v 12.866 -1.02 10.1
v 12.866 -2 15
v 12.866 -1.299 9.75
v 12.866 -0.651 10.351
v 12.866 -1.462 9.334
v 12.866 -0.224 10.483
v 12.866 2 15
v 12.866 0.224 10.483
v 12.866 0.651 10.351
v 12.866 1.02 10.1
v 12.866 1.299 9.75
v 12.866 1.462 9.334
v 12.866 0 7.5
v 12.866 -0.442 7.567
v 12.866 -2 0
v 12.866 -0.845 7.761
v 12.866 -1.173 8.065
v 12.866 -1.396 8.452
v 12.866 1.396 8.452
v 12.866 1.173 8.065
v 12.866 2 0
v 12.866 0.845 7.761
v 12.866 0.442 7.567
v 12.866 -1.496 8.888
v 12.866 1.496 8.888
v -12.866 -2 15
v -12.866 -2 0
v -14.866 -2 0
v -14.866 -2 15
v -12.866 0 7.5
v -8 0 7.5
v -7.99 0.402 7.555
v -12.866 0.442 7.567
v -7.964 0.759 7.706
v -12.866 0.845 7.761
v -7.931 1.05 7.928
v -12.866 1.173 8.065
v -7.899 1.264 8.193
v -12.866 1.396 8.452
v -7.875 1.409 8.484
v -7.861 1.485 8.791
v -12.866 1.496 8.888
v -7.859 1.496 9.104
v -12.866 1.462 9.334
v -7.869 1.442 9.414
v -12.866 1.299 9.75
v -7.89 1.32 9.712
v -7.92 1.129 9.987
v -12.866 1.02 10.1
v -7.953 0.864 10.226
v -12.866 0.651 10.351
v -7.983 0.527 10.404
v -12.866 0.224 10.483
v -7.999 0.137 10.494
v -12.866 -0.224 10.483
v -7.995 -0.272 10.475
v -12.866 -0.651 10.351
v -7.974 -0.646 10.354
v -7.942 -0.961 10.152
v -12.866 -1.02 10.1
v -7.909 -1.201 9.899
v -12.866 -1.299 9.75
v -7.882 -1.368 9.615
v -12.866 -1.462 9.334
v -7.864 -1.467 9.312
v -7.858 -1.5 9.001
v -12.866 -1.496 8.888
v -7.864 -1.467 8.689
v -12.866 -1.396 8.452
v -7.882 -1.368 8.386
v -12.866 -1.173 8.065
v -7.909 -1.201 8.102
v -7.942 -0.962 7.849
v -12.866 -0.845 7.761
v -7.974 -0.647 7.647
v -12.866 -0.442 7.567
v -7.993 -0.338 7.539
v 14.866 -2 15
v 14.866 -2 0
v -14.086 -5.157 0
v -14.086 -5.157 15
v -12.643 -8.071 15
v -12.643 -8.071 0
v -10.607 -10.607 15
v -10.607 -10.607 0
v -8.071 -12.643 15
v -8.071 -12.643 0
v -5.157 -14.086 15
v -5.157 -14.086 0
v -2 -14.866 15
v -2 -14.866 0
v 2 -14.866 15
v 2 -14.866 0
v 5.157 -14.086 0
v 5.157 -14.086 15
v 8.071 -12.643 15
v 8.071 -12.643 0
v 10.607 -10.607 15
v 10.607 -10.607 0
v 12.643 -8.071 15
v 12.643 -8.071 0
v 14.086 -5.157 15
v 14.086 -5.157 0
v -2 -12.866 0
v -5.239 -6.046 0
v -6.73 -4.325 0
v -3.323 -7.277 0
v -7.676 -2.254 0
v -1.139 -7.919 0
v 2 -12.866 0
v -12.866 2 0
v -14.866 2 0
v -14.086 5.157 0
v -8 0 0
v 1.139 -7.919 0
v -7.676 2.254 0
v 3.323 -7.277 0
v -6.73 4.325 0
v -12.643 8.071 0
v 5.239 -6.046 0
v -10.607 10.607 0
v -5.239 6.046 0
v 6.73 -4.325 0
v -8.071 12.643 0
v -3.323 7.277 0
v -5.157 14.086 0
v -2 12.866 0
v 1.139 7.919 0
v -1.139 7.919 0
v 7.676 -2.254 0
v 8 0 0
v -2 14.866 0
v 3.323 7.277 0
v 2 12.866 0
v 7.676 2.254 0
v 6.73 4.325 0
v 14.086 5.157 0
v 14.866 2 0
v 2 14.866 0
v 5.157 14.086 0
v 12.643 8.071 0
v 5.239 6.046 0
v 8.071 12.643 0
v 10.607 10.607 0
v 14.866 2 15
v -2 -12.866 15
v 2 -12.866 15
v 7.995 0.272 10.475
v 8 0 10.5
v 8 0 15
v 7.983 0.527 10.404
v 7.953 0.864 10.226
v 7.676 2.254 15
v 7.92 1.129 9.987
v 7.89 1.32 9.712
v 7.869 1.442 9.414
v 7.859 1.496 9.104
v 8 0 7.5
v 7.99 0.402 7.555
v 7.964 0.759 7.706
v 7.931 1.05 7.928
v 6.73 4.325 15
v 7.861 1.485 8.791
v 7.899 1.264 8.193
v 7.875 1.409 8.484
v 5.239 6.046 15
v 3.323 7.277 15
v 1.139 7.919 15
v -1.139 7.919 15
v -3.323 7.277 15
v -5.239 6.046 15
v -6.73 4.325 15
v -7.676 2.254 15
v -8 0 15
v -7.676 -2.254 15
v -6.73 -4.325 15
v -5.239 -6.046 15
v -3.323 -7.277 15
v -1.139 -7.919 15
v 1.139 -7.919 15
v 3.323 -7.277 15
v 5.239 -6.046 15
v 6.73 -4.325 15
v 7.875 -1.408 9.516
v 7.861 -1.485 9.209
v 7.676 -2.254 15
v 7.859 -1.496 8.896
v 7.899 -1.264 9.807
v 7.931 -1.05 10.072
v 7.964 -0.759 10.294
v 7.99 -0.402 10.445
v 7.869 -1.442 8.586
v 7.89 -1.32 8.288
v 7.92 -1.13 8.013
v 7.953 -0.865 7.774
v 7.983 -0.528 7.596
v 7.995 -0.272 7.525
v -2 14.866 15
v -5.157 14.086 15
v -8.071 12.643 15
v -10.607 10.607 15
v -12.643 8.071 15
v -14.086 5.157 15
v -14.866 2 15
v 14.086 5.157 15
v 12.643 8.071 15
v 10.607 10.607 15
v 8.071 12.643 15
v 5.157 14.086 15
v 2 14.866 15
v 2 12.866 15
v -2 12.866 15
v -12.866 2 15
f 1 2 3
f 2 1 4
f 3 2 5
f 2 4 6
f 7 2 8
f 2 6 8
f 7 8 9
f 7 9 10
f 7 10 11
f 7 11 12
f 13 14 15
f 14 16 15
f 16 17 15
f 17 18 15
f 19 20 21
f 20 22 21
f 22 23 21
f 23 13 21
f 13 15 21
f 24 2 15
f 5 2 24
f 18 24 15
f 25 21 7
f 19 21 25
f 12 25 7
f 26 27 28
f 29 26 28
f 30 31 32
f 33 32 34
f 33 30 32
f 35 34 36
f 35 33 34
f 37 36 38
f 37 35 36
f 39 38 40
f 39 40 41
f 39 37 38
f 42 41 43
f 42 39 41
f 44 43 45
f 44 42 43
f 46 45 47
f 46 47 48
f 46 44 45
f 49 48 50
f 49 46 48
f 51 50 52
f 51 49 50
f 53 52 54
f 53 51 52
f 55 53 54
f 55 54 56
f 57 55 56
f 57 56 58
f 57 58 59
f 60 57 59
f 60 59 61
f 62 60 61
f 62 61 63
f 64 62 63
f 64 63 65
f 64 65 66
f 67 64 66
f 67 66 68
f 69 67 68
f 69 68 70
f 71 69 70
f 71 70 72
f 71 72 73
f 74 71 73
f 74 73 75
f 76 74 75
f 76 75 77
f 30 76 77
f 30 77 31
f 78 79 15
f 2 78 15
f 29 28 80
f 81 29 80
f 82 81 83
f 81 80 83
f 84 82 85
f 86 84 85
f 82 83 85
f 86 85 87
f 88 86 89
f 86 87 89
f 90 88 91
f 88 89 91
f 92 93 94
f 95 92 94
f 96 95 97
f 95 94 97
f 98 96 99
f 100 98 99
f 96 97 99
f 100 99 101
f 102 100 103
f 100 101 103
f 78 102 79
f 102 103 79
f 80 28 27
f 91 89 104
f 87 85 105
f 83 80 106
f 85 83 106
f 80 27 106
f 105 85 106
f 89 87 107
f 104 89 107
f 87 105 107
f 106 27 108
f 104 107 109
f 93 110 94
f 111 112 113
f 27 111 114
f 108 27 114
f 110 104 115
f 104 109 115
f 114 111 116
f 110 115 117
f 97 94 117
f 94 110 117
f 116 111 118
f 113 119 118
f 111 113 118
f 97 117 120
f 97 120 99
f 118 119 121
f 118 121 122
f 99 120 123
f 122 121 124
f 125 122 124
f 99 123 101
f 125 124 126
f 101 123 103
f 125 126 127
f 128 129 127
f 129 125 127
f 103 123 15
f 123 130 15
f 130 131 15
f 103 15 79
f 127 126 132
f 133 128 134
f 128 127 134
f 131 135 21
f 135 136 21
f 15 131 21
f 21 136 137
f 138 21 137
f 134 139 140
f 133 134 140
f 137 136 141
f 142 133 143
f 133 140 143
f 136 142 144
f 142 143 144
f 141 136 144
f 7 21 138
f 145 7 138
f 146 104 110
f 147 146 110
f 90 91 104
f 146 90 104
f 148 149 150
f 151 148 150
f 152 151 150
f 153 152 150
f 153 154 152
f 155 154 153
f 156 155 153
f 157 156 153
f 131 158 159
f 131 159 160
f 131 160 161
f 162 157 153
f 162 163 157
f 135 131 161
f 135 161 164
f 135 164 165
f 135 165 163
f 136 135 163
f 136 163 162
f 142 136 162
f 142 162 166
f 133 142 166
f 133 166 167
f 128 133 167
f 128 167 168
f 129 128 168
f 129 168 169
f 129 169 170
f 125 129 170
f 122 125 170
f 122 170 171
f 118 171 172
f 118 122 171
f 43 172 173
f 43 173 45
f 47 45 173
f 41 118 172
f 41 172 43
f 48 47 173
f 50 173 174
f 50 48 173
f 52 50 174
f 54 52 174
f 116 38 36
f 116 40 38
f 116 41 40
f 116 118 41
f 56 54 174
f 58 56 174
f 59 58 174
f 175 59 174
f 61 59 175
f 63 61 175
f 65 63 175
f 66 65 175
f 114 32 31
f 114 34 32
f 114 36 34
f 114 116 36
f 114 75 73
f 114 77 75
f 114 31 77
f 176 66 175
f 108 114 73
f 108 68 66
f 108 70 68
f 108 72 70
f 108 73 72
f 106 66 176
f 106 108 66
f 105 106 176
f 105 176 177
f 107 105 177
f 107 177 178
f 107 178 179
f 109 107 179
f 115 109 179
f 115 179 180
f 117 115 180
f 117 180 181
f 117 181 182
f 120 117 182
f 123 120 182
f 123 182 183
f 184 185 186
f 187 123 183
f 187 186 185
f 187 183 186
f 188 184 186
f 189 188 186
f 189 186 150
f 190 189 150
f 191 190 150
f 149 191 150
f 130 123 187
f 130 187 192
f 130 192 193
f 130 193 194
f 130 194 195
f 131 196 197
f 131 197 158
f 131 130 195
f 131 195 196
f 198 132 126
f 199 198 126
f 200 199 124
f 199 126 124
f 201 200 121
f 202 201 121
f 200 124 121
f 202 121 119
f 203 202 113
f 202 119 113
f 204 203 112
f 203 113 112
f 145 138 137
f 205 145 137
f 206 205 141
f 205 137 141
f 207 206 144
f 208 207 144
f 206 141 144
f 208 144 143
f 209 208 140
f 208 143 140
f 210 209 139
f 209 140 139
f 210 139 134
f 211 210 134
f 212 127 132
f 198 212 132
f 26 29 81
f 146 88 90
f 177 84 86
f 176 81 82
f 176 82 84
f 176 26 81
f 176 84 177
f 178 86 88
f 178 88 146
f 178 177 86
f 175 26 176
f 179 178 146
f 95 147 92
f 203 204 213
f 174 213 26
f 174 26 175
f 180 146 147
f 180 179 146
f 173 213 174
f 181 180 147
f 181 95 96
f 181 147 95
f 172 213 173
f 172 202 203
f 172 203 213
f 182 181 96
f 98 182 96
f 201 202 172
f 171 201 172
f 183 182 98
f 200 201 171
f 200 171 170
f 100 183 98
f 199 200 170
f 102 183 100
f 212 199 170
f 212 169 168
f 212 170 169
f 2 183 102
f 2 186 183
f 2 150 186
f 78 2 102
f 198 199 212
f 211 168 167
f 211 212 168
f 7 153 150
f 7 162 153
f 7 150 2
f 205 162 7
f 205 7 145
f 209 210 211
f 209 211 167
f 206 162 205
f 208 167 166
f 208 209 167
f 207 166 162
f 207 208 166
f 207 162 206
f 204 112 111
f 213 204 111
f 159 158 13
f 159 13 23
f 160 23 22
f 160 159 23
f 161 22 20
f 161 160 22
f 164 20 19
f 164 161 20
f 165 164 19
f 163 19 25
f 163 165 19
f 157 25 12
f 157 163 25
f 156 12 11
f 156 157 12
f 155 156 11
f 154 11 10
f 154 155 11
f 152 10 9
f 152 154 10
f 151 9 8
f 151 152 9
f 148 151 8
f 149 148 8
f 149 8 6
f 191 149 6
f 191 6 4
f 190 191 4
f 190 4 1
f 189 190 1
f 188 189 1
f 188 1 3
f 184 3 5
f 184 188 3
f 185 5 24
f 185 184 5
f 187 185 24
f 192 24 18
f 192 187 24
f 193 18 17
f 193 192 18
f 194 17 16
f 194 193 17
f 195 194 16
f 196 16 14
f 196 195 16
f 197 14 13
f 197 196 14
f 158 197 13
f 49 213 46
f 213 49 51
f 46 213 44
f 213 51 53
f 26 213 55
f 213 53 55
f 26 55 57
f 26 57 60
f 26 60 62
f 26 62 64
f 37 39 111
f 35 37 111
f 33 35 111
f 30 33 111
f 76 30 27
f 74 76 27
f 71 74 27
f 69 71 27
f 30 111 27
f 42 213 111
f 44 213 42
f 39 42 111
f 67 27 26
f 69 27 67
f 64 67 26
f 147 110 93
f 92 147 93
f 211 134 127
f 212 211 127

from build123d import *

# Parameters (mm, degrees)
ESBO_O1_R                  = 8
RESSALTO_EXTRUS_O1_DEPTH   = 15
CORTE_EXTRUS_O1_DEPTH      = 26.82634314
CORTE_EXTRUS_O1_DEPTH_BACK = 26.82634314
ESBO_O2_R                  = 1.5


with BuildPart() as part:
    # Esboço1 → Ressalto-extrusão1 (new body)
    with BuildSketch(Plane.XY):
        with BuildLine():
            Line((2, 12.866068747), (-2, 12.866068747))
            Line((-2, 12.866068747), (-2, 14.866068747))
            ThreePointArc((-2, 14.866068747), (-10.606601718, 10.606601718), (-14.866068747, 2))
            Line((-14.866068747, 2), (-12.866068747, 2))
            Line((-12.866068747, 2), (-12.866068747, -2))
            Line((-12.866068747, -2), (-14.866068747, -2))
            ThreePointArc((-14.866068747, -2), (-10.606601718, -10.606601718), (-2, -14.866068747))
            Line((-2, -14.866068747), (-2, -12.866068747))
            Line((-2, -12.866068747), (2, -12.866068747))
            Line((2, -12.866068747), (2, -14.866068747))
            ThreePointArc((2, -14.866068747), (10.606601718, -10.606601718), (14.866068747, -2))
            Line((14.866068747, -2), (12.866068747, -2))
            Line((12.866068747, -2), (12.866068747, 2))
            Line((12.866068747, 2), (14.866068747, 2))
            ThreePointArc((14.866068747, 2), (10.606601718, 10.606601718), (2, 14.866068747))
            Line((2, 14.866068747), (2, 12.866068747))
        make_face()
        Circle(ESBO_O1_R, mode=Mode.SUBTRACT)
    extrude(amount=RESSALTO_EXTRUS_O1_DEPTH)

    # Esboço2 → Corte-extrusão1 (cut, two sides: drawn at the far end of the back side and taken through both)
    with BuildSketch(Plane(origin=(0, 0, 0), x_dir=(0, 0, -1), z_dir=(1, 0, 0)).offset(-CORTE_EXTRUS_O1_DEPTH_BACK)):
        with Locations((-9, 0)):
            Circle(ESBO_O2_R)
    extrude(amount=CORTE_EXTRUS_O1_DEPTH + CORTE_EXTRUS_O1_DEPTH_BACK, mode=Mode.SUBTRACT)


solid = part.part
